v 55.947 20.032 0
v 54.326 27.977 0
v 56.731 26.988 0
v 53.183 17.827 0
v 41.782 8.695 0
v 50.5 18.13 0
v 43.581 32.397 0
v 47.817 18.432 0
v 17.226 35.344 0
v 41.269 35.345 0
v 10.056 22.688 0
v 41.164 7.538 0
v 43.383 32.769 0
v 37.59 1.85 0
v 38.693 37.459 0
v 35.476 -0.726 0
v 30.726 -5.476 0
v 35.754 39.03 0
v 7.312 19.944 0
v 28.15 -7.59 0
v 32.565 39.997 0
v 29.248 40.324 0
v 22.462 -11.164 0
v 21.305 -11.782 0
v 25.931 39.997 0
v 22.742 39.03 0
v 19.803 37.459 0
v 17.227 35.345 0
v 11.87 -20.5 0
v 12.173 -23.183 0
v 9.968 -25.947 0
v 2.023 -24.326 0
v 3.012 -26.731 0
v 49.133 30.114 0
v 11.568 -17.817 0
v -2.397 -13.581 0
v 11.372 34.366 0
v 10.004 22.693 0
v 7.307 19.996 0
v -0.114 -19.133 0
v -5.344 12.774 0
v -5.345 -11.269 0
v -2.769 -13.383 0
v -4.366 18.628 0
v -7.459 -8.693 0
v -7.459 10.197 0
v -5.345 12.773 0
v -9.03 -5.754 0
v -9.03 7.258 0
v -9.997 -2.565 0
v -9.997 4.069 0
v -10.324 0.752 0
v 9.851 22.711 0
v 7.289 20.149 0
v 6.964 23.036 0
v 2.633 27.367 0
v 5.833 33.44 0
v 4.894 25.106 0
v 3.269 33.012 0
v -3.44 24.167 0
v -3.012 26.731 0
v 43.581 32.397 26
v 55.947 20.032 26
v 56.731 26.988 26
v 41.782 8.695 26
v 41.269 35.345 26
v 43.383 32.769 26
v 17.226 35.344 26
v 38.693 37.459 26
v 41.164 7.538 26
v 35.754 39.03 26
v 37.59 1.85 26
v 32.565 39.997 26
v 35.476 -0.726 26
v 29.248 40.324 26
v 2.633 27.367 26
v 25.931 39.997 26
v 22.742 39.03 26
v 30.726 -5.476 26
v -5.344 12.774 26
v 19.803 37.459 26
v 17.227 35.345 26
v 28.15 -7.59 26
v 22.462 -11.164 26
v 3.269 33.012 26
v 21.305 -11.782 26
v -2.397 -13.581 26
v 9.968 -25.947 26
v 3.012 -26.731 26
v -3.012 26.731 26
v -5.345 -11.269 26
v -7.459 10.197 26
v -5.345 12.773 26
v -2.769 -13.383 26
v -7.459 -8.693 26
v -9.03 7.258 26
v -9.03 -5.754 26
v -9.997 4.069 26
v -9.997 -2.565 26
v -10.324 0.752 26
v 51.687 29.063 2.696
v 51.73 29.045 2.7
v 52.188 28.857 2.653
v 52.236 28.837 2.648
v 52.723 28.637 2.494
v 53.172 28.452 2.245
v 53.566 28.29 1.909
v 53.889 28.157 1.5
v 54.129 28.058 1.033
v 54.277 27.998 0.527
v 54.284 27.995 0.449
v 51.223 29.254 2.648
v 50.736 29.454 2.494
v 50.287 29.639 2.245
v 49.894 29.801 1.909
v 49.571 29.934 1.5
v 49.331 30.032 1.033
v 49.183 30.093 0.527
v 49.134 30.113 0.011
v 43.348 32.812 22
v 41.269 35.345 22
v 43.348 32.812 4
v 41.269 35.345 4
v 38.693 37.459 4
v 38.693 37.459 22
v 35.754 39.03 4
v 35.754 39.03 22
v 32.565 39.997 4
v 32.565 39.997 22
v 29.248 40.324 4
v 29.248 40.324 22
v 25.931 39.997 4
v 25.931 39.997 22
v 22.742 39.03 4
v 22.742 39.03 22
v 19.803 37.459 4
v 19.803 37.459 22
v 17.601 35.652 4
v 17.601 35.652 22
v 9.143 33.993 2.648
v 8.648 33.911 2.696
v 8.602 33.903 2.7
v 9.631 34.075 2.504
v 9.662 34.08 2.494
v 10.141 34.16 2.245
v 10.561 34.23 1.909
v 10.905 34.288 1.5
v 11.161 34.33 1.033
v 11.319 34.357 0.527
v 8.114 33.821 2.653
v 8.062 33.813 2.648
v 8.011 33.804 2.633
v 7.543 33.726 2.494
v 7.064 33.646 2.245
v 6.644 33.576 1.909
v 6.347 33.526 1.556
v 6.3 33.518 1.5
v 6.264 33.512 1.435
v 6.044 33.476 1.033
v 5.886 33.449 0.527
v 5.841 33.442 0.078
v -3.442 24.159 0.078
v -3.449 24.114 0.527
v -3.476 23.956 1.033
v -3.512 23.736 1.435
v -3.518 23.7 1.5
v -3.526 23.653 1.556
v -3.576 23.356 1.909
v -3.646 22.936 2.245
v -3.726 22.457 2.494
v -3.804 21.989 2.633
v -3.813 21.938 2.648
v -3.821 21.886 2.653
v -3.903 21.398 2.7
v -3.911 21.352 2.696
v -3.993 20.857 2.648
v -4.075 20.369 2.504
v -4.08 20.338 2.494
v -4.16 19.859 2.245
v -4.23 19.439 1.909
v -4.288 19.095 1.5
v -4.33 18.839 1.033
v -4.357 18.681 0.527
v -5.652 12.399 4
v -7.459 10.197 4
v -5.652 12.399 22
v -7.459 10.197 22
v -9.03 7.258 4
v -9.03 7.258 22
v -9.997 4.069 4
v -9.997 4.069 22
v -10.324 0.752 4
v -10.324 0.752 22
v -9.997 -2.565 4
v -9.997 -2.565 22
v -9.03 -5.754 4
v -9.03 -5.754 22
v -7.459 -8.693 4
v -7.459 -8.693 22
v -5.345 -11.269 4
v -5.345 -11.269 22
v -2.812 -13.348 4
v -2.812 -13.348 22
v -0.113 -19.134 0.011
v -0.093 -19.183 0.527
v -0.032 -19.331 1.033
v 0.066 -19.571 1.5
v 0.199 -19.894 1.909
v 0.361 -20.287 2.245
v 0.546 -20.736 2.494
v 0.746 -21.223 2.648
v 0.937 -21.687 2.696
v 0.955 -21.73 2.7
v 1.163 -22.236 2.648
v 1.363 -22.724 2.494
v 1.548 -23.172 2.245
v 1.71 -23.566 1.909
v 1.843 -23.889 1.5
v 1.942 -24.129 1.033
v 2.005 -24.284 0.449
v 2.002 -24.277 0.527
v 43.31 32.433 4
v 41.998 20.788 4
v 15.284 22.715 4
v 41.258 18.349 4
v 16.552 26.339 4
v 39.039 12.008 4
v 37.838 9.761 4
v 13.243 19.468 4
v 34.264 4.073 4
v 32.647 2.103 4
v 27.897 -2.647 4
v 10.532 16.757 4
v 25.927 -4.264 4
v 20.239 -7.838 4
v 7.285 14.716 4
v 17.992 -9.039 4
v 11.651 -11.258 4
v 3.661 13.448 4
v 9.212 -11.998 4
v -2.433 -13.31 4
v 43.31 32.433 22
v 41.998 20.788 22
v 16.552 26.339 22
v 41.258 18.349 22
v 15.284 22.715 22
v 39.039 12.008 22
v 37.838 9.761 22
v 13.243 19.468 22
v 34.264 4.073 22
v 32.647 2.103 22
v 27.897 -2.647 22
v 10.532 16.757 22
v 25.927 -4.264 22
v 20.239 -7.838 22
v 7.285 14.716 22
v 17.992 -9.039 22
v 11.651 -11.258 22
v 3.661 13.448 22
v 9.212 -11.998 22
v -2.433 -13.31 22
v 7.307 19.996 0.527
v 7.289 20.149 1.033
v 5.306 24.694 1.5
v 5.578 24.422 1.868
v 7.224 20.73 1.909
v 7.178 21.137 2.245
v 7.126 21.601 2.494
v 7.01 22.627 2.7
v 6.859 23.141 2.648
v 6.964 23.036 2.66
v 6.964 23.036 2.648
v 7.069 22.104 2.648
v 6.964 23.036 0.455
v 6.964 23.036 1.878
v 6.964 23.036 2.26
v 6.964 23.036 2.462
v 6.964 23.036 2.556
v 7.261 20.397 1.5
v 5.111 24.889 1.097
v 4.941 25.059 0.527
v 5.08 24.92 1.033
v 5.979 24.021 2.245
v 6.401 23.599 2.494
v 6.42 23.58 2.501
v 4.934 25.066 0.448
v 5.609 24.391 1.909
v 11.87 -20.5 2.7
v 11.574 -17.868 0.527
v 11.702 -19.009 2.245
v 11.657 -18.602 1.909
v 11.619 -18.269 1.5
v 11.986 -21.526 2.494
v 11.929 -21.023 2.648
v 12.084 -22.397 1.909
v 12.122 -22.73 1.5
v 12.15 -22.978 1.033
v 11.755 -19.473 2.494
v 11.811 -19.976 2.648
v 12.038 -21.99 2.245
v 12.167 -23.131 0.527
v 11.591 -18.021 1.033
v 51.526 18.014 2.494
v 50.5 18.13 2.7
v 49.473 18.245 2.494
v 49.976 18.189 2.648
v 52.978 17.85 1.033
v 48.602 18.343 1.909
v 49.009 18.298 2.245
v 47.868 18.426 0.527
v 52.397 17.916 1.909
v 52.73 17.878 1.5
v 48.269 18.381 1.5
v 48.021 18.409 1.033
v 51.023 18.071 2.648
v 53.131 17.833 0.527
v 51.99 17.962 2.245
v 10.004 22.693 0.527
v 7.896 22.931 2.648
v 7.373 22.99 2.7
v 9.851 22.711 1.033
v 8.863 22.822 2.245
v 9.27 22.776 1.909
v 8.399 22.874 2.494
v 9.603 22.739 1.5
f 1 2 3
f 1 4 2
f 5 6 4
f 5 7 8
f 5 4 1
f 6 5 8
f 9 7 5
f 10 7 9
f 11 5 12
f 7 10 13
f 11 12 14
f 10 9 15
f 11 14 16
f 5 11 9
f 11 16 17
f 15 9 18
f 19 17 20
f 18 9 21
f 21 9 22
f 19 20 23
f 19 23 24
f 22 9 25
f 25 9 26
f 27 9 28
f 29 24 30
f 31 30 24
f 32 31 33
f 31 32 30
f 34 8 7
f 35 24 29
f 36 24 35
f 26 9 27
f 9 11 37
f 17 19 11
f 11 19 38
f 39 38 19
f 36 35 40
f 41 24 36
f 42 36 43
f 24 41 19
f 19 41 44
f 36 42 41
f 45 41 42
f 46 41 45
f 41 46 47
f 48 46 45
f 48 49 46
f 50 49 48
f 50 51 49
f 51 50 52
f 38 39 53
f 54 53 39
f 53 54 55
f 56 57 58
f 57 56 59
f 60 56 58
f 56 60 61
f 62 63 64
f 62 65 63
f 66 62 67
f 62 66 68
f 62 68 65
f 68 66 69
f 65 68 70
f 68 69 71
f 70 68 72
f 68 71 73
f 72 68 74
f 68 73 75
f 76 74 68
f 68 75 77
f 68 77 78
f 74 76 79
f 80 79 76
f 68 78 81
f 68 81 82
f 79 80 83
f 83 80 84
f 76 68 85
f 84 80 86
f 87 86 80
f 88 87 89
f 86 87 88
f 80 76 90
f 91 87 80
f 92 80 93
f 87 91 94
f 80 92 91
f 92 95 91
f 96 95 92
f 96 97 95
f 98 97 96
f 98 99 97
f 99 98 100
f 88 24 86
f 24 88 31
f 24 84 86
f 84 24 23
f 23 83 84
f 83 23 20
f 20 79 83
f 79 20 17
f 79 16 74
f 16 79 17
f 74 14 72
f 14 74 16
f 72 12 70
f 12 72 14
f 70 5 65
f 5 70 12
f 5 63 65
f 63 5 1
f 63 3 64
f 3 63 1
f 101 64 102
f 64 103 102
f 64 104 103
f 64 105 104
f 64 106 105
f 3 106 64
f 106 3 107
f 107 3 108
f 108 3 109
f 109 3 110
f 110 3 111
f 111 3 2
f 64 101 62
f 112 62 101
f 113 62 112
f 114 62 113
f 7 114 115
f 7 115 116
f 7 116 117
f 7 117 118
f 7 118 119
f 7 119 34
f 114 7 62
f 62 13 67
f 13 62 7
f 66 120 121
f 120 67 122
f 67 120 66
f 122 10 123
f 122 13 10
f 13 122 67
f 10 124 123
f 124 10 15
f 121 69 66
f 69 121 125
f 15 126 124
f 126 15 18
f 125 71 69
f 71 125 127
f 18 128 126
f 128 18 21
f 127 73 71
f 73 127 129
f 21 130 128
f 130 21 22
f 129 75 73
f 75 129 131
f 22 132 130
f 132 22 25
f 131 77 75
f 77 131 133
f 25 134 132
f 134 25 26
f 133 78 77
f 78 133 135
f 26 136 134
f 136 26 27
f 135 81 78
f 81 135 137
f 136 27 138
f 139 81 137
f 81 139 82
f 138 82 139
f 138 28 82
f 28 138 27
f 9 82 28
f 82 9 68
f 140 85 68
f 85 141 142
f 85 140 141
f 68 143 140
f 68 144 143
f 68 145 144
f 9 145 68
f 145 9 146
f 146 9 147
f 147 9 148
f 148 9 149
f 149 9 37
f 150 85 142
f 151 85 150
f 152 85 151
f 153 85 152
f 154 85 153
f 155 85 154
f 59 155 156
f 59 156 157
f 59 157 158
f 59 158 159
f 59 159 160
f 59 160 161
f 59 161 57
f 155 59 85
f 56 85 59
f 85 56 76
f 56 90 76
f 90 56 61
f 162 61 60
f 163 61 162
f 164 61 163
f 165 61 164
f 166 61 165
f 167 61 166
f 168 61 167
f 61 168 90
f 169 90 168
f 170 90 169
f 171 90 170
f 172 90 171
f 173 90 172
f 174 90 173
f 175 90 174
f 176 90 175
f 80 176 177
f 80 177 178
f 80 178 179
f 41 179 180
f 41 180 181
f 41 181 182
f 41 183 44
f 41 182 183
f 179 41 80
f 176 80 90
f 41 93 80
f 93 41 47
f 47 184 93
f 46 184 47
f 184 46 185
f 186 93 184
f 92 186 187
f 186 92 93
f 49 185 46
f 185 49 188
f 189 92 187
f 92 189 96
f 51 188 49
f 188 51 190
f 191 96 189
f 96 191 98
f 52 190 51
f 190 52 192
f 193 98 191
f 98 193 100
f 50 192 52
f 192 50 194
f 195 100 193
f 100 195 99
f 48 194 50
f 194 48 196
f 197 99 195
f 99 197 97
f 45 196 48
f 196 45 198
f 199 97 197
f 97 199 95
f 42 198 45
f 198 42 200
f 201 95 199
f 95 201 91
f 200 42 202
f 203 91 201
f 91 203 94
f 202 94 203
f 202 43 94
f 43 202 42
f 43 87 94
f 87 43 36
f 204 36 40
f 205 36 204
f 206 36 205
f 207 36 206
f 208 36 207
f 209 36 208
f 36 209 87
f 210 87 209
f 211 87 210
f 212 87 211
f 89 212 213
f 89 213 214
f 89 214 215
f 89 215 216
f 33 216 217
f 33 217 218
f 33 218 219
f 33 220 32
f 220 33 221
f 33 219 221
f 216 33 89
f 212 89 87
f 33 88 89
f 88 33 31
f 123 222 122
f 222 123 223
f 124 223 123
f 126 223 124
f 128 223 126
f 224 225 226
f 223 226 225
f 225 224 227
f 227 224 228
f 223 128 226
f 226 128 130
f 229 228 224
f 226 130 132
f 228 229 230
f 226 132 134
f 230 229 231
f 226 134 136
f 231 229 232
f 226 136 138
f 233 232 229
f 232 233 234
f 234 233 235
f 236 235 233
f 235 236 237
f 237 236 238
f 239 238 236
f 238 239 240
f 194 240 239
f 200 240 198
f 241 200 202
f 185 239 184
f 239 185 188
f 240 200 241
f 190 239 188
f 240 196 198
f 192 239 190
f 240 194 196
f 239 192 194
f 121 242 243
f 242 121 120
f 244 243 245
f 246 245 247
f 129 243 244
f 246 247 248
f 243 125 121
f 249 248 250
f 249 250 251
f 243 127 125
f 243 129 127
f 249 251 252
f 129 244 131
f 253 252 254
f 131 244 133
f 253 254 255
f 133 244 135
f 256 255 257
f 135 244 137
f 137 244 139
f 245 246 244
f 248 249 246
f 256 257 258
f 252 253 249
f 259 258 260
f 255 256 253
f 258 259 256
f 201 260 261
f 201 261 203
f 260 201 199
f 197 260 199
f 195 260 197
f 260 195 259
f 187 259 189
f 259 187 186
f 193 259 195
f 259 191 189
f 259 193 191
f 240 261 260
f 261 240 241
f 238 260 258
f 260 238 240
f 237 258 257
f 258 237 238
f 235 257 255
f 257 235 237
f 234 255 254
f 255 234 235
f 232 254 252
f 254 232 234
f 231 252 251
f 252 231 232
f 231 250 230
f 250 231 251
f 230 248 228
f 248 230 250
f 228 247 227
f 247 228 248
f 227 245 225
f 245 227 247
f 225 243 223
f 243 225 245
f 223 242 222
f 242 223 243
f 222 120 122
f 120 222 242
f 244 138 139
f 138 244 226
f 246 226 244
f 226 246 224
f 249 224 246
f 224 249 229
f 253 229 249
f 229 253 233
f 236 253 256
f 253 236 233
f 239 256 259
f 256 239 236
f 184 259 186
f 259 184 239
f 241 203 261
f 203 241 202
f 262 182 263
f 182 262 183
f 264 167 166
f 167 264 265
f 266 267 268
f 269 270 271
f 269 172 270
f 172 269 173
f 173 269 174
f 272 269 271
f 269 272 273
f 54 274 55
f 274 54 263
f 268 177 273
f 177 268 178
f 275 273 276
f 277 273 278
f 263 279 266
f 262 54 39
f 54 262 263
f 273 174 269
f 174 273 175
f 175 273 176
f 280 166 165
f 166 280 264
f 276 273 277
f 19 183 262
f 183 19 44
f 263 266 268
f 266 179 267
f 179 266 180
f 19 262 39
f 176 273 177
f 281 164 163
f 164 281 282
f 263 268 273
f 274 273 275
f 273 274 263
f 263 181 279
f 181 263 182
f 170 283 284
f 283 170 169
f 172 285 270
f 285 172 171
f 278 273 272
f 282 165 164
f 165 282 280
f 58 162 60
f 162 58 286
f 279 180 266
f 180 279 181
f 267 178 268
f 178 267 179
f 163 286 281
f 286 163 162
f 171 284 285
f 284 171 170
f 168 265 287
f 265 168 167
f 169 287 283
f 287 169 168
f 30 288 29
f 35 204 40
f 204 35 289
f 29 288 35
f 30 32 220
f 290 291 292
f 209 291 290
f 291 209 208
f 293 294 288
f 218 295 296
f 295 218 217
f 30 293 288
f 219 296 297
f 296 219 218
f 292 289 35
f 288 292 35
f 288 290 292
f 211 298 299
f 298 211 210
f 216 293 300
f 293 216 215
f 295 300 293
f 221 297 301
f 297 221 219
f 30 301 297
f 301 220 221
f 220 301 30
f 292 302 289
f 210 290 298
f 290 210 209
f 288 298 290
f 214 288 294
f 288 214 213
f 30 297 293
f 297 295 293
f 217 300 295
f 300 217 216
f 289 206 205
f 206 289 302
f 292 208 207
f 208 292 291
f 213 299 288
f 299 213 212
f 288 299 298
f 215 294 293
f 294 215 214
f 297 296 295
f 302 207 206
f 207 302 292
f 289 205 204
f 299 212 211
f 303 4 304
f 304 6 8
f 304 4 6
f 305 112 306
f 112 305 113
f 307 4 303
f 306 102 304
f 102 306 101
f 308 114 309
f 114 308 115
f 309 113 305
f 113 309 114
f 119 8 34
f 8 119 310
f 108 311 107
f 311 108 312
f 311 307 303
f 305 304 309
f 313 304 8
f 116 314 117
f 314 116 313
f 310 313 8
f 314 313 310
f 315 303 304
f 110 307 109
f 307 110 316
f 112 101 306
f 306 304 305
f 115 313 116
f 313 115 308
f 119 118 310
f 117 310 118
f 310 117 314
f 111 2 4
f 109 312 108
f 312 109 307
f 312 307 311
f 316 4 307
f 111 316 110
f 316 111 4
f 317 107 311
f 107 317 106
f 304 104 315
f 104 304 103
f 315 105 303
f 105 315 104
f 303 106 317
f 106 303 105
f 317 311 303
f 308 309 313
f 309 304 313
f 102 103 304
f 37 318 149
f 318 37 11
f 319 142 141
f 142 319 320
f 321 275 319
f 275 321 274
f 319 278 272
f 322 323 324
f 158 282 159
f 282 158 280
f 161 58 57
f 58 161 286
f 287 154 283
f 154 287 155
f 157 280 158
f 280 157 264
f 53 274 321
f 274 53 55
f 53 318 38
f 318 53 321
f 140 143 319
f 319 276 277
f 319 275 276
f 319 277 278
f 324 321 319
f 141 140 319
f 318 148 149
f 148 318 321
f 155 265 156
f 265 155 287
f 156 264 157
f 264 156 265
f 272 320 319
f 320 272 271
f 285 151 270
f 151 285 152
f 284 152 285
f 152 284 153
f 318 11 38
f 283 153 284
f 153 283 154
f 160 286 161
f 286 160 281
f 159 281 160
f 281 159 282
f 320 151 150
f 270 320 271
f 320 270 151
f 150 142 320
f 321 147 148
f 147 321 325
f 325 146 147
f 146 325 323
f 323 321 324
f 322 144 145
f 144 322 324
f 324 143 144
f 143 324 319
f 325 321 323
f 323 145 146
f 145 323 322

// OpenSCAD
$fn = 32;

// ----------------------------------------------------------------------
// Air duct: 34 mm duct, 4 mm wall, 26 mm across
// ----------------------------------------------------------------------

// --- parameters (mm) ---
duct_r = 17;              // duct core radius
duct_d = 34;              // duct core diameter
wall = 4;                 // duct wall thickness
height = 26;              // duct width (extrusion height)
port_r = 26.9;            // port flange half width
port_d = 53.8;            // port flange width
port_t = 7;               // port flange thickness
bolt_d = 5.4;             // port bolt holes
bolt_offset = 21.7;       // bolt hole offset from the port axis

difference() {
  /* outer hull chain: tube with a flat flange plate at every port */
  linear_extrude(height = 26) {
    hull() {
      polygon([[3.012, -26.731], [-3.012, 26.731], [3.944, 27.515], [9.968, -25.947]]);
      translate([9.937, 1.12]) circle(r = 17);
    }
    hull() {
      translate([9.937, 1.12]) circle(r = 17);
      translate([6.676, 0.752]) circle(r = 17);
    }
    hull() {
      translate([6.676, 0.752]) circle(r = 17);
      translate([13.017, 2.971]) circle(r = 17);
    }
    hull() {
      translate([13.017, 2.971]) circle(r = 17);
      translate([18.705, 6.545]) circle(r = 17);
    }
    hull() {
      translate([18.705, 6.545]) circle(r = 17);
      translate([23.455, 11.295]) circle(r = 17);
    }
    hull() {
      translate([23.455, 11.295]) circle(r = 17);
      translate([27.029, 16.983]) circle(r = 17);
    }
    hull() {
      translate([27.029, 16.983]) circle(r = 17);
      translate([29.248, 23.324]) circle(r = 17);
    }
    hull() {
      translate([29.248, 23.324]) circle(r = 17);
      translate([28.88, 20.063]) circle(r = 17);
    }
    hull() {
      translate([28.88, 20.063]) circle(r = 17);
      polygon([[3.269, 33.012], [56.731, 26.988], [55.947, 20.032], [2.485, 26.056]]);
    }
  }
  /* air passage: the same chain inset by the wall, 5 mm proud of the ports */
  translate([0, 0, 4]) linear_extrude(height = 18) {
    hull() {
      translate([-4.969, -0.56]) circle(r = 13);
      translate([6.676, 0.752]) circle(r = 13);
    }
    hull() {
      translate([6.676, 0.752]) circle(r = 13);
      translate([13.017, 2.971]) circle(r = 13);
    }
    hull() {
      translate([13.017, 2.971]) circle(r = 13);
      translate([18.705, 6.545]) circle(r = 13);
    }
    hull() {
      translate([18.705, 6.545]) circle(r = 13);
      translate([23.455, 11.295]) circle(r = 13);
    }
    hull() {
      translate([23.455, 11.295]) circle(r = 13);
      translate([27.029, 16.983]) circle(r = 13);
    }
    hull() {
      translate([27.029, 16.983]) circle(r = 13);
      translate([29.248, 23.324]) circle(r = 13);
    }
    hull() {
      translate([29.248, 23.324]) circle(r = 13);
      translate([30.56, 34.969]) circle(r = 13);
    }
  }
  translate([0, 0]) rotate([0, 0, -83.57]) translate([-21.7, -2.5]) rotate([-90, 0, 0]) cylinder(h = 12, d = 5.4);
  translate([0, 0]) rotate([0, 0, -83.57]) translate([21.7, -2.5]) rotate([-90, 0, 0]) cylinder(h = 12, d = 5.4);
  translate([30, 30]) rotate([0, 0, 173.57]) translate([-21.7, -2.5]) rotate([-90, 0, 0]) cylinder(h = 12, d = 5.4);
  translate([30, 30]) rotate([0, 0, 173.57]) translate([21.7, -2.5]) rotate([-90, 0, 0]) cylinder(h = 12, d = 5.4);
}
